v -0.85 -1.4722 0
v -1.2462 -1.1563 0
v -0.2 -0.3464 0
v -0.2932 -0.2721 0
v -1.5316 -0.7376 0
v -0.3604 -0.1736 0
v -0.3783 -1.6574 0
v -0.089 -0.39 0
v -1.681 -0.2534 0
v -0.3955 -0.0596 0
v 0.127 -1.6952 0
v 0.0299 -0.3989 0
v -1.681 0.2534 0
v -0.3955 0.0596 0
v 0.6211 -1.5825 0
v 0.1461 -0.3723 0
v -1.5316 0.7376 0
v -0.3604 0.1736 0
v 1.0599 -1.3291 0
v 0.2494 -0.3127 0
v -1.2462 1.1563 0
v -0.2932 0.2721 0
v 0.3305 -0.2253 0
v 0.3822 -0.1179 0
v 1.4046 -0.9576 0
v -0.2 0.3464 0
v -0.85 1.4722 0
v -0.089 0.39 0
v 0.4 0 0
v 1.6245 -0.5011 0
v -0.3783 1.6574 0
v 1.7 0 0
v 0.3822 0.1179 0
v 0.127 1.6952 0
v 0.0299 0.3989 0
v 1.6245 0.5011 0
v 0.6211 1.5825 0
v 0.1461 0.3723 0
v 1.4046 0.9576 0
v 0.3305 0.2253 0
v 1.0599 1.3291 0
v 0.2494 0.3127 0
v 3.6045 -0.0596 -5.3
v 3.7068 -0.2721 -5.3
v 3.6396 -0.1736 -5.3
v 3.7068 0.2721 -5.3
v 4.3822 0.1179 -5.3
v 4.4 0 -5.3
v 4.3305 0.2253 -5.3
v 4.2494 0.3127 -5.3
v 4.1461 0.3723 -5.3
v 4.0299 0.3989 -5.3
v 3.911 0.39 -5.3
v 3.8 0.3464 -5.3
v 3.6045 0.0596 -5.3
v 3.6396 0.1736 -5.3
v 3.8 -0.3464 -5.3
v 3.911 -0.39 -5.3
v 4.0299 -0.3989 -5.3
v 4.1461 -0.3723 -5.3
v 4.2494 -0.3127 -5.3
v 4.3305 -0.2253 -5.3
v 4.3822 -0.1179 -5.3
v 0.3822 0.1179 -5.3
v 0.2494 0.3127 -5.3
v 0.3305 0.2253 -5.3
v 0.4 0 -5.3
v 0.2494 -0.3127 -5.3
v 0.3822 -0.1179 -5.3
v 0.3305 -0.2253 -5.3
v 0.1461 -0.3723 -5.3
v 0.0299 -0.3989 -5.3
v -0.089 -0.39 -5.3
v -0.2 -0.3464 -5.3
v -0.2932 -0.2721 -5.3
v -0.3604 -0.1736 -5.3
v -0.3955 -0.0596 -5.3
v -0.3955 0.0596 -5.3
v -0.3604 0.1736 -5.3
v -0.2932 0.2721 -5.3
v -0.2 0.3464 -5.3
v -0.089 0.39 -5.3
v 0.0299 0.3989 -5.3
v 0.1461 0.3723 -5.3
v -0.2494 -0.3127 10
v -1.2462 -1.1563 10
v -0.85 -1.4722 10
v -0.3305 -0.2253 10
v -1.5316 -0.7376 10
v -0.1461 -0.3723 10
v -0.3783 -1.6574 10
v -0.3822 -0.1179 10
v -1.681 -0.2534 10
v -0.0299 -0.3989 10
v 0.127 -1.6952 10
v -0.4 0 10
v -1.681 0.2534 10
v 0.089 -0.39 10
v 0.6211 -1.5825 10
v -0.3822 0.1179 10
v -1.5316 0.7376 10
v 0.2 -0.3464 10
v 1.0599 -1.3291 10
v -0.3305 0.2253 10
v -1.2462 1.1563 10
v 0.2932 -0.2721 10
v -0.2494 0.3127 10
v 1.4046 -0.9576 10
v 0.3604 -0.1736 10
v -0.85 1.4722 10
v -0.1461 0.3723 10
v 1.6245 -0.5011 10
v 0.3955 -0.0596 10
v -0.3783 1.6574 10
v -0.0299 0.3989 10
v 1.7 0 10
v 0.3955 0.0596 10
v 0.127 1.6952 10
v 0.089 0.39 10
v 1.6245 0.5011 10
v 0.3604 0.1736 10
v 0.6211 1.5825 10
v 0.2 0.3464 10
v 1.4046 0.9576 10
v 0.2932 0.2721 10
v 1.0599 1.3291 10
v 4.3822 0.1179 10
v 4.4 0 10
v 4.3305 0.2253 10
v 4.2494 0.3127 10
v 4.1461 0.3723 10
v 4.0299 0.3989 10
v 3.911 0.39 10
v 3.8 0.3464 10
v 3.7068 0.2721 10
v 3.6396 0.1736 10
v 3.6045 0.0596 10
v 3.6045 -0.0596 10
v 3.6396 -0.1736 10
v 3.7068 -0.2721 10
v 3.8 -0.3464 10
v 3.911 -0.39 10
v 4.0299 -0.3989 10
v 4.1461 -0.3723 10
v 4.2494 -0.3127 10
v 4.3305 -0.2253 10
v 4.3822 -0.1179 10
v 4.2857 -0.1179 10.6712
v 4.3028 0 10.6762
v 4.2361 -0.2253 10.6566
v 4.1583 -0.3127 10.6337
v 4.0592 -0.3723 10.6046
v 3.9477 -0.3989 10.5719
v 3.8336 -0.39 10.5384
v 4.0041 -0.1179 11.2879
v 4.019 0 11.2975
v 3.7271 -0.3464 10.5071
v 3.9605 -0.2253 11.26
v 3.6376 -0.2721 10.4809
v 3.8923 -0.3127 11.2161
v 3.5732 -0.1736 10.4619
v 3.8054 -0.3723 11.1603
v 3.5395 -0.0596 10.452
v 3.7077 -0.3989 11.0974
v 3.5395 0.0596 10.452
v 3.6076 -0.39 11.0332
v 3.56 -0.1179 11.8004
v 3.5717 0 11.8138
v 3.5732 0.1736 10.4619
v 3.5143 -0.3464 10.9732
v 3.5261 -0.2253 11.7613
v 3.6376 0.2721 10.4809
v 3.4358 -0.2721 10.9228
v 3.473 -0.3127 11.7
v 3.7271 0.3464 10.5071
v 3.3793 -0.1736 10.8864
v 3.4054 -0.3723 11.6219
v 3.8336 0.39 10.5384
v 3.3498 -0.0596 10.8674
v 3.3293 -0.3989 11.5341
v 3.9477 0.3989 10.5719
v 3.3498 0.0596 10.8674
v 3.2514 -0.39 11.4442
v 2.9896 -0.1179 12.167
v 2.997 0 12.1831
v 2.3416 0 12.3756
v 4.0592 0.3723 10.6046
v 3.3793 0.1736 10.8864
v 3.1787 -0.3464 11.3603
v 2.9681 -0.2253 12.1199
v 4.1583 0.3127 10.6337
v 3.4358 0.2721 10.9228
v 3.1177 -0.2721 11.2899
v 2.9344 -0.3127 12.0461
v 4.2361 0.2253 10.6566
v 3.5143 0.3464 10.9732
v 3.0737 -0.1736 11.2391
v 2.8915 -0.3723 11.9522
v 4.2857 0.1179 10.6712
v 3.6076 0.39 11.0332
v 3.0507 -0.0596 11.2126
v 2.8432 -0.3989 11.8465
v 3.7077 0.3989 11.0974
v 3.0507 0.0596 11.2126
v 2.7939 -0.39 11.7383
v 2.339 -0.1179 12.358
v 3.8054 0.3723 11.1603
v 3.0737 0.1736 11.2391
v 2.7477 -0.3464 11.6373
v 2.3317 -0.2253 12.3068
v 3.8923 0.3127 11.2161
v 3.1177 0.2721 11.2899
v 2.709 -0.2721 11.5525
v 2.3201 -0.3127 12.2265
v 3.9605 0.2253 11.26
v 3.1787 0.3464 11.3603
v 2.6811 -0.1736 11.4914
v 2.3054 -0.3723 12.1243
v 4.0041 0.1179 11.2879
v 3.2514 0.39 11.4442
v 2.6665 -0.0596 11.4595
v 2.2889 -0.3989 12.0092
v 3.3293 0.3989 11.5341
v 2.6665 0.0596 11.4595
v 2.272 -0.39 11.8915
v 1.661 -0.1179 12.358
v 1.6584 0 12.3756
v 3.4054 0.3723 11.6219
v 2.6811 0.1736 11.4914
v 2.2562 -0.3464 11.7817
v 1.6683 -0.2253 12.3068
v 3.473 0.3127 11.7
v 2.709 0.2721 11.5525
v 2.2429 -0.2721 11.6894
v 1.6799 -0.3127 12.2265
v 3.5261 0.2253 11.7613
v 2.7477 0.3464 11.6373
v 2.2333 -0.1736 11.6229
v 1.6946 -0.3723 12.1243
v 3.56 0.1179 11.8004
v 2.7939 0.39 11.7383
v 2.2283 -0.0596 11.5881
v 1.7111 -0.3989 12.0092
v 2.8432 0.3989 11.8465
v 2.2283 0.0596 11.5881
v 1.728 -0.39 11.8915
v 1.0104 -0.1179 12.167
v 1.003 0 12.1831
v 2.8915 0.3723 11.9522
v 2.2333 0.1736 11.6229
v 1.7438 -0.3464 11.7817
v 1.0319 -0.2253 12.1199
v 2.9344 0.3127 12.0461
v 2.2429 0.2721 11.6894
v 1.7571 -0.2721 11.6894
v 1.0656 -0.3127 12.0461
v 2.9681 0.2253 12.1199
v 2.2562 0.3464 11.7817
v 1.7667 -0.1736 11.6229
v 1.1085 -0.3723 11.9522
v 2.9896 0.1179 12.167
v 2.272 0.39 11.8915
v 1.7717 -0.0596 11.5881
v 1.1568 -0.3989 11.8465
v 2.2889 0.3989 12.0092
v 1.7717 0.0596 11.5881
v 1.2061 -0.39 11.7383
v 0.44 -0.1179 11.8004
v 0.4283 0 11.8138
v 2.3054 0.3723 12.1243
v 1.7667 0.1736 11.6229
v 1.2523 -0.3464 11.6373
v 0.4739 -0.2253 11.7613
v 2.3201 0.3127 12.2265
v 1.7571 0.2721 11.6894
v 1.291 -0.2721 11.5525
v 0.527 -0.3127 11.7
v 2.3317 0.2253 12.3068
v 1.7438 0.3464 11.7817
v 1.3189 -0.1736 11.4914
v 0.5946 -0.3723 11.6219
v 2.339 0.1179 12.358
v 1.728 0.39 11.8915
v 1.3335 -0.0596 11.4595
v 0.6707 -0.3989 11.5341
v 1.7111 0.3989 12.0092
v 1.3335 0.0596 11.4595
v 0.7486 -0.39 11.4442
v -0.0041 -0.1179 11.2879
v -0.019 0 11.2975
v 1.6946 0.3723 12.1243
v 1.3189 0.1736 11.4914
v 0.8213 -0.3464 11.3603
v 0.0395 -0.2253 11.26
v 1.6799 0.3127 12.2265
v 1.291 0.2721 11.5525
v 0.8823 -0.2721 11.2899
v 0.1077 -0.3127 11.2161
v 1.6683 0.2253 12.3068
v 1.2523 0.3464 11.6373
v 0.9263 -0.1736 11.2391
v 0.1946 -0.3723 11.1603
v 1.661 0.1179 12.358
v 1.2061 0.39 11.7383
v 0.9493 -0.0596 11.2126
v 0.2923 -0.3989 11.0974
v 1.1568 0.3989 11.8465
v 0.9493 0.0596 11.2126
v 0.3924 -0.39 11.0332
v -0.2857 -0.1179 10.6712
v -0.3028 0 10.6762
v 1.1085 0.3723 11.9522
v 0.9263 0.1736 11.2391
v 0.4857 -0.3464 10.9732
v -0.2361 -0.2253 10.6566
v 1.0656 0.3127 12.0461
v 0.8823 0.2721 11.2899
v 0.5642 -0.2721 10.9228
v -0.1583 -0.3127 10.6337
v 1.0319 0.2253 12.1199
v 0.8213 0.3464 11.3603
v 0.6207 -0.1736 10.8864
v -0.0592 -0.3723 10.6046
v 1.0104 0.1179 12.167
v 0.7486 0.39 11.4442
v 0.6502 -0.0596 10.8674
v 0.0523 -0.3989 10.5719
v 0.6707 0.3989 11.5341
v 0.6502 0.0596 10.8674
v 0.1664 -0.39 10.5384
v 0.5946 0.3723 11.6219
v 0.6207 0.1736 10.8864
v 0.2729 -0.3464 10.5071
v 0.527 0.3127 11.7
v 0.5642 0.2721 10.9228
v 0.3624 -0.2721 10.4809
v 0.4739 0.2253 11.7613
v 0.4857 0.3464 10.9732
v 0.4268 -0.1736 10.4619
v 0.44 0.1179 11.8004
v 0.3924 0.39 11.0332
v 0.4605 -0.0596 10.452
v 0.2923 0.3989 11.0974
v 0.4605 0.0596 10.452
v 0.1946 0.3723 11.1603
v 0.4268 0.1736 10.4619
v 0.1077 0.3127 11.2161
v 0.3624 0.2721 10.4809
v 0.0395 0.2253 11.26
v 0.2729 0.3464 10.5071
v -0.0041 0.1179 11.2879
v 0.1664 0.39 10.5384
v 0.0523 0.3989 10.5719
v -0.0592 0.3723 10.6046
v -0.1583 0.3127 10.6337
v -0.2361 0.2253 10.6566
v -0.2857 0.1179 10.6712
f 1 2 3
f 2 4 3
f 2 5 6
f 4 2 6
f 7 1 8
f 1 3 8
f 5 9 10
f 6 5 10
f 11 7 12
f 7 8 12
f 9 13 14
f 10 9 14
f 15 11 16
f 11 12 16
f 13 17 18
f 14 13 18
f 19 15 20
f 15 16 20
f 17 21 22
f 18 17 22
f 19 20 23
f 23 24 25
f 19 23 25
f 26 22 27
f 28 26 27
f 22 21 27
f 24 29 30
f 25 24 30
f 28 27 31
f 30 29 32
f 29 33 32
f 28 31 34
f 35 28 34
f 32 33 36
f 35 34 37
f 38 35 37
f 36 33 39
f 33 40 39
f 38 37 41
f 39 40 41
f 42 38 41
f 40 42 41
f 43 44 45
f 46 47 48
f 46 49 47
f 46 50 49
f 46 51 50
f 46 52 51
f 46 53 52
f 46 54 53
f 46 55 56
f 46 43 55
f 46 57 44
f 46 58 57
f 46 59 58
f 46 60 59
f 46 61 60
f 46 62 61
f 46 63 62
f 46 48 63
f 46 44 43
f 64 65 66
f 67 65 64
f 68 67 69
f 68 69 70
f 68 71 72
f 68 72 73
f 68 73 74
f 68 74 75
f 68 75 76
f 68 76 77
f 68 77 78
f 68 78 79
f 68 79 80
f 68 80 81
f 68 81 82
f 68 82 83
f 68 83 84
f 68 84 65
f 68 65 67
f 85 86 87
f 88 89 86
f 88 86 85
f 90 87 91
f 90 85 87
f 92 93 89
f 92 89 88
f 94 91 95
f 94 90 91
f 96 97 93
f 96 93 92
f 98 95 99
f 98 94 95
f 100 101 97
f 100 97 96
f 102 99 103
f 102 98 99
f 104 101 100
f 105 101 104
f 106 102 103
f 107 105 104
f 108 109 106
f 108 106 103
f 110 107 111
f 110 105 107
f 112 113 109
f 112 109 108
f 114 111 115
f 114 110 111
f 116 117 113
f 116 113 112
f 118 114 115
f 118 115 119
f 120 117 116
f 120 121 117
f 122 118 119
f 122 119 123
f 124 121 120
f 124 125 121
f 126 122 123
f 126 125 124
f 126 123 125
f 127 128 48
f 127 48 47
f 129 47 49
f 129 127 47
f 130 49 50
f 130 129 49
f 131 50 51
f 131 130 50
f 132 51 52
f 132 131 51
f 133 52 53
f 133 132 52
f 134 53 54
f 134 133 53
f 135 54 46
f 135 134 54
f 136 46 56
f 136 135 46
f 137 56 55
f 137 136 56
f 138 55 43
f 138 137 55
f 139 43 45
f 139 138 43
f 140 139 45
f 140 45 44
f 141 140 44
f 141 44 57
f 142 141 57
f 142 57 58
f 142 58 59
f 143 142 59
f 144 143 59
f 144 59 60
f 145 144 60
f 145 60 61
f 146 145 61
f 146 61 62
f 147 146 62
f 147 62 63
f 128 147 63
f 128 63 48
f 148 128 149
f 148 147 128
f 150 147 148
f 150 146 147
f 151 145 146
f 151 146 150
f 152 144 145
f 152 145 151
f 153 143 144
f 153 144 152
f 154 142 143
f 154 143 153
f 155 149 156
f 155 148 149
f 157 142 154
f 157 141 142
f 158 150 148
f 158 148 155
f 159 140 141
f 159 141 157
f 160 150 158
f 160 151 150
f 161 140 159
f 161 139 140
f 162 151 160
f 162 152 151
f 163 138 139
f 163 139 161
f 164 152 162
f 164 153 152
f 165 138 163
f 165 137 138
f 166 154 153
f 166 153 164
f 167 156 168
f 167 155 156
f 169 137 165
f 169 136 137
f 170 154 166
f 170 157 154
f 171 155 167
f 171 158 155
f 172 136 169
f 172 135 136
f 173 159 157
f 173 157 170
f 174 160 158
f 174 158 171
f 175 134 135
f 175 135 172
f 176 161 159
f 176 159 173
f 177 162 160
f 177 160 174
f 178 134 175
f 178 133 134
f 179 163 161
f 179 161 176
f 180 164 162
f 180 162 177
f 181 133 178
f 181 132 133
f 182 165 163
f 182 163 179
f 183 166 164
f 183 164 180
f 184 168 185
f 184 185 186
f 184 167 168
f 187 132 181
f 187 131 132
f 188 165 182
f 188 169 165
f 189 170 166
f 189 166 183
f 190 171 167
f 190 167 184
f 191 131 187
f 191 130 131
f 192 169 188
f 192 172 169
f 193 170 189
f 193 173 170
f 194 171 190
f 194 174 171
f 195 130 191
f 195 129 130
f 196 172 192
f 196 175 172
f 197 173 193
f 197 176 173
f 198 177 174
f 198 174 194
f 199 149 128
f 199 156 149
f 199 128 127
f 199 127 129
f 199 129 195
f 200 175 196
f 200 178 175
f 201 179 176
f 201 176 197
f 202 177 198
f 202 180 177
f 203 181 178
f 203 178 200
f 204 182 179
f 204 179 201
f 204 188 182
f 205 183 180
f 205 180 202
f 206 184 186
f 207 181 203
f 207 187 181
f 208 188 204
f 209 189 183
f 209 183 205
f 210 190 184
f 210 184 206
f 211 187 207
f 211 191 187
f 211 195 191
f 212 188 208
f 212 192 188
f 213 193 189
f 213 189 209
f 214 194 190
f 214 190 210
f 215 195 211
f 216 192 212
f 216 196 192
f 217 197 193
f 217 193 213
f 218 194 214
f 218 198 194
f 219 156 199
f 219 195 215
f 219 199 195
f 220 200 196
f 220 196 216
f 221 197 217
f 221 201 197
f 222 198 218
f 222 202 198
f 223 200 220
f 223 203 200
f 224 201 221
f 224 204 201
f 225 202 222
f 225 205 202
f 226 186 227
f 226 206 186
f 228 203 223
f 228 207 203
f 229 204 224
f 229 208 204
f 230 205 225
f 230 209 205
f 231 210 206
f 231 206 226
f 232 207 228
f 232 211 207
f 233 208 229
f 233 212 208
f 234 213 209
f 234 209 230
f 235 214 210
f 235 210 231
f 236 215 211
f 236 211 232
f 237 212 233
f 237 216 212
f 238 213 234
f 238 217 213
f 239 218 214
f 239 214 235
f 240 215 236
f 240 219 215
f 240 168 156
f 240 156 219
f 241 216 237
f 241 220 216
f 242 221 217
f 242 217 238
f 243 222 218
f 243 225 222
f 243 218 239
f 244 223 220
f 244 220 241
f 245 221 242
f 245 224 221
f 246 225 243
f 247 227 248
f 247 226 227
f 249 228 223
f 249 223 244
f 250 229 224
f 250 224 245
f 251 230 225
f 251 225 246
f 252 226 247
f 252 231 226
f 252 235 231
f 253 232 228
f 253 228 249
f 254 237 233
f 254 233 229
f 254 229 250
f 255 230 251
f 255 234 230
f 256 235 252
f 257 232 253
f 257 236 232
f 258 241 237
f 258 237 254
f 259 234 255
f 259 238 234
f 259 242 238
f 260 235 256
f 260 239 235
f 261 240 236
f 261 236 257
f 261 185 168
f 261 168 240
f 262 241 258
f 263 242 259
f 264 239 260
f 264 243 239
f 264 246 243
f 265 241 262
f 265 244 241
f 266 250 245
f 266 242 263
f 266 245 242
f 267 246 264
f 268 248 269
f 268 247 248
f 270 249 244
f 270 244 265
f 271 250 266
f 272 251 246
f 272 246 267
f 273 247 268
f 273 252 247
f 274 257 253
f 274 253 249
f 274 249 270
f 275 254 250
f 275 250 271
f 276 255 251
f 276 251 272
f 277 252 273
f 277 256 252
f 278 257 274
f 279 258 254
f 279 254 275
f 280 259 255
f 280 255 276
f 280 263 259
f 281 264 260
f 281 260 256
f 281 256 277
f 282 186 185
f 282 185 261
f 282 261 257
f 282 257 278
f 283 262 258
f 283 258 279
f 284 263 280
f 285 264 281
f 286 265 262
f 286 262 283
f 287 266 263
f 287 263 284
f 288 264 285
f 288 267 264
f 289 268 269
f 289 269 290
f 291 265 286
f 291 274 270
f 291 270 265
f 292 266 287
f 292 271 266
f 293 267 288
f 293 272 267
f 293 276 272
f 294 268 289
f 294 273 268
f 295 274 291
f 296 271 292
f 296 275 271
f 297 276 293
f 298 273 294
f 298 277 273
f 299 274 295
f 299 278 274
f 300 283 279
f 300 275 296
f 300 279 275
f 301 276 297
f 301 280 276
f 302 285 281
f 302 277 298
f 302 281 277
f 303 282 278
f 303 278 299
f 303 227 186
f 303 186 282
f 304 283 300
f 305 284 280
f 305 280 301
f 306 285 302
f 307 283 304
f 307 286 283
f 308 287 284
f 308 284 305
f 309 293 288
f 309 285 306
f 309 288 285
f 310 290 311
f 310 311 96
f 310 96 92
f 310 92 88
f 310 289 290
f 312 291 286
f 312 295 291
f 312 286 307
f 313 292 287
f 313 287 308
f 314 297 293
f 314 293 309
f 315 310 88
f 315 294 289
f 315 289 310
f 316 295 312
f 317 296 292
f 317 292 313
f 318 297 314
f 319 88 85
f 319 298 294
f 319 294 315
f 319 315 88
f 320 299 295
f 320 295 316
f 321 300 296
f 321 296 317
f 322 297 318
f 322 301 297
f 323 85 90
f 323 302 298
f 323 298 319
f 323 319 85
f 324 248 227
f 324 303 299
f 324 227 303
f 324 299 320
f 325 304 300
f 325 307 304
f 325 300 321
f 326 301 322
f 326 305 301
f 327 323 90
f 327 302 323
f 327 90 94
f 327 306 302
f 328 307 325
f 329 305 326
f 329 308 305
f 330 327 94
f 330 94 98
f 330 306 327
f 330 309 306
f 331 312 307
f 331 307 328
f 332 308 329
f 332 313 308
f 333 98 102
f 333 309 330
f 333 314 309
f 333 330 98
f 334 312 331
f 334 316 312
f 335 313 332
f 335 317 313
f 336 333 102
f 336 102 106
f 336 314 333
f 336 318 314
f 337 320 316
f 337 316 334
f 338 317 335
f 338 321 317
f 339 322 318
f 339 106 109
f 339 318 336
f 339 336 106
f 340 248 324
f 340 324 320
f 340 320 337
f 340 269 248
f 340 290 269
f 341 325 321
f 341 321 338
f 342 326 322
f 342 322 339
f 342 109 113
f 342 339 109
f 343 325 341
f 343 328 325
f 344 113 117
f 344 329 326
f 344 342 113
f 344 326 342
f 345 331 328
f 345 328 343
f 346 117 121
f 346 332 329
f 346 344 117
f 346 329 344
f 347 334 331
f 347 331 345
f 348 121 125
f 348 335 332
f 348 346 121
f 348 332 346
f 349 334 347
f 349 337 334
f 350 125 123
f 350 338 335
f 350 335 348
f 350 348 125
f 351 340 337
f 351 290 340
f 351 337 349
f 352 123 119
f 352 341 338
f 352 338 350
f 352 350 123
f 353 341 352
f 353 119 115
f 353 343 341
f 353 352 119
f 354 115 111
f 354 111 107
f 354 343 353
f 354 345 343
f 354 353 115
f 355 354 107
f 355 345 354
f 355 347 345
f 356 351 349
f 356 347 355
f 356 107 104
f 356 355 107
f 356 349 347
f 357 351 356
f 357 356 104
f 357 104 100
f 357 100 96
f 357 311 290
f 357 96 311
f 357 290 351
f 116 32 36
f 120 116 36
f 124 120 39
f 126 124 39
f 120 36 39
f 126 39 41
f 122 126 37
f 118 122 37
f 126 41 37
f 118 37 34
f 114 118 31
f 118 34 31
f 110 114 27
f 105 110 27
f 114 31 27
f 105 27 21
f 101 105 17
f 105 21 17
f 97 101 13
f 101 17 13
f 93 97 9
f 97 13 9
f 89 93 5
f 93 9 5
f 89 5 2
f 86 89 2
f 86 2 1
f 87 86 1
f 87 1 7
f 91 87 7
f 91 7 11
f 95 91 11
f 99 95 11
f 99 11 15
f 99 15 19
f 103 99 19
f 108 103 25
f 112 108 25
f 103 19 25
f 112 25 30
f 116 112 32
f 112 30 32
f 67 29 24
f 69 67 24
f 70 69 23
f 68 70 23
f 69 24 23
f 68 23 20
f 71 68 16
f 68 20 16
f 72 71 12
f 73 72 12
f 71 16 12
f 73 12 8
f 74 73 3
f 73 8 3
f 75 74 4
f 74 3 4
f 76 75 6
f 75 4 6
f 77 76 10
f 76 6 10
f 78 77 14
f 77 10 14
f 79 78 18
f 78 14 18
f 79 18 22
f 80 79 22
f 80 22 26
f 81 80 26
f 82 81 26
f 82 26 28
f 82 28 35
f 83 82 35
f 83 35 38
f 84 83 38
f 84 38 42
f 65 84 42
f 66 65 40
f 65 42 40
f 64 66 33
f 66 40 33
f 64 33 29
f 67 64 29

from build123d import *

# Parameters (mm, degrees)
SKETCH2_R           = 1.7
RESISTOR_BODY_DEPTH = 10
LEAD1_PROFILE_R     = 0.4
SKETCH6_R           = 0.4
LEAD2_DEPTH         = 5.3


with BuildPart() as part:
    # Sketch2 → Resistor Body (new body)
    with BuildSketch(Plane.XY):
        Circle(SKETCH2_R)
    extrude(amount=RESISTOR_BODY_DEPTH)

    # Lead1: sweep along a path in Lead1 Path
    with BuildLine(Plane(origin=(0, 0, 0), x_dir=(1, 0, 0), z_dir=(0, 1, 0))) as lead1_path:
        Line((4, 5.3), (4, -10))
        ThreePointArc((4, -10), (2, -12), (0, -10))
    # Lead1 Profile → Lead1 (sweep)
    with BuildSketch(Plane(origin=(0, 0, 10), x_dir=(-1, 0, 0), z_dir=(0, 0, 1))):
        Circle(LEAD1_PROFILE_R)
    sweep(path=lead1_path.line)

    # Sketch6 → Lead2 (add)
    with BuildSketch(Plane(origin=(0, 0, 0), x_dir=(1, 0, 0), z_dir=(0, 0, -1))):
        Circle(SKETCH6_R)
    extrude(amount=LEAD2_DEPTH)


solid = part.part
